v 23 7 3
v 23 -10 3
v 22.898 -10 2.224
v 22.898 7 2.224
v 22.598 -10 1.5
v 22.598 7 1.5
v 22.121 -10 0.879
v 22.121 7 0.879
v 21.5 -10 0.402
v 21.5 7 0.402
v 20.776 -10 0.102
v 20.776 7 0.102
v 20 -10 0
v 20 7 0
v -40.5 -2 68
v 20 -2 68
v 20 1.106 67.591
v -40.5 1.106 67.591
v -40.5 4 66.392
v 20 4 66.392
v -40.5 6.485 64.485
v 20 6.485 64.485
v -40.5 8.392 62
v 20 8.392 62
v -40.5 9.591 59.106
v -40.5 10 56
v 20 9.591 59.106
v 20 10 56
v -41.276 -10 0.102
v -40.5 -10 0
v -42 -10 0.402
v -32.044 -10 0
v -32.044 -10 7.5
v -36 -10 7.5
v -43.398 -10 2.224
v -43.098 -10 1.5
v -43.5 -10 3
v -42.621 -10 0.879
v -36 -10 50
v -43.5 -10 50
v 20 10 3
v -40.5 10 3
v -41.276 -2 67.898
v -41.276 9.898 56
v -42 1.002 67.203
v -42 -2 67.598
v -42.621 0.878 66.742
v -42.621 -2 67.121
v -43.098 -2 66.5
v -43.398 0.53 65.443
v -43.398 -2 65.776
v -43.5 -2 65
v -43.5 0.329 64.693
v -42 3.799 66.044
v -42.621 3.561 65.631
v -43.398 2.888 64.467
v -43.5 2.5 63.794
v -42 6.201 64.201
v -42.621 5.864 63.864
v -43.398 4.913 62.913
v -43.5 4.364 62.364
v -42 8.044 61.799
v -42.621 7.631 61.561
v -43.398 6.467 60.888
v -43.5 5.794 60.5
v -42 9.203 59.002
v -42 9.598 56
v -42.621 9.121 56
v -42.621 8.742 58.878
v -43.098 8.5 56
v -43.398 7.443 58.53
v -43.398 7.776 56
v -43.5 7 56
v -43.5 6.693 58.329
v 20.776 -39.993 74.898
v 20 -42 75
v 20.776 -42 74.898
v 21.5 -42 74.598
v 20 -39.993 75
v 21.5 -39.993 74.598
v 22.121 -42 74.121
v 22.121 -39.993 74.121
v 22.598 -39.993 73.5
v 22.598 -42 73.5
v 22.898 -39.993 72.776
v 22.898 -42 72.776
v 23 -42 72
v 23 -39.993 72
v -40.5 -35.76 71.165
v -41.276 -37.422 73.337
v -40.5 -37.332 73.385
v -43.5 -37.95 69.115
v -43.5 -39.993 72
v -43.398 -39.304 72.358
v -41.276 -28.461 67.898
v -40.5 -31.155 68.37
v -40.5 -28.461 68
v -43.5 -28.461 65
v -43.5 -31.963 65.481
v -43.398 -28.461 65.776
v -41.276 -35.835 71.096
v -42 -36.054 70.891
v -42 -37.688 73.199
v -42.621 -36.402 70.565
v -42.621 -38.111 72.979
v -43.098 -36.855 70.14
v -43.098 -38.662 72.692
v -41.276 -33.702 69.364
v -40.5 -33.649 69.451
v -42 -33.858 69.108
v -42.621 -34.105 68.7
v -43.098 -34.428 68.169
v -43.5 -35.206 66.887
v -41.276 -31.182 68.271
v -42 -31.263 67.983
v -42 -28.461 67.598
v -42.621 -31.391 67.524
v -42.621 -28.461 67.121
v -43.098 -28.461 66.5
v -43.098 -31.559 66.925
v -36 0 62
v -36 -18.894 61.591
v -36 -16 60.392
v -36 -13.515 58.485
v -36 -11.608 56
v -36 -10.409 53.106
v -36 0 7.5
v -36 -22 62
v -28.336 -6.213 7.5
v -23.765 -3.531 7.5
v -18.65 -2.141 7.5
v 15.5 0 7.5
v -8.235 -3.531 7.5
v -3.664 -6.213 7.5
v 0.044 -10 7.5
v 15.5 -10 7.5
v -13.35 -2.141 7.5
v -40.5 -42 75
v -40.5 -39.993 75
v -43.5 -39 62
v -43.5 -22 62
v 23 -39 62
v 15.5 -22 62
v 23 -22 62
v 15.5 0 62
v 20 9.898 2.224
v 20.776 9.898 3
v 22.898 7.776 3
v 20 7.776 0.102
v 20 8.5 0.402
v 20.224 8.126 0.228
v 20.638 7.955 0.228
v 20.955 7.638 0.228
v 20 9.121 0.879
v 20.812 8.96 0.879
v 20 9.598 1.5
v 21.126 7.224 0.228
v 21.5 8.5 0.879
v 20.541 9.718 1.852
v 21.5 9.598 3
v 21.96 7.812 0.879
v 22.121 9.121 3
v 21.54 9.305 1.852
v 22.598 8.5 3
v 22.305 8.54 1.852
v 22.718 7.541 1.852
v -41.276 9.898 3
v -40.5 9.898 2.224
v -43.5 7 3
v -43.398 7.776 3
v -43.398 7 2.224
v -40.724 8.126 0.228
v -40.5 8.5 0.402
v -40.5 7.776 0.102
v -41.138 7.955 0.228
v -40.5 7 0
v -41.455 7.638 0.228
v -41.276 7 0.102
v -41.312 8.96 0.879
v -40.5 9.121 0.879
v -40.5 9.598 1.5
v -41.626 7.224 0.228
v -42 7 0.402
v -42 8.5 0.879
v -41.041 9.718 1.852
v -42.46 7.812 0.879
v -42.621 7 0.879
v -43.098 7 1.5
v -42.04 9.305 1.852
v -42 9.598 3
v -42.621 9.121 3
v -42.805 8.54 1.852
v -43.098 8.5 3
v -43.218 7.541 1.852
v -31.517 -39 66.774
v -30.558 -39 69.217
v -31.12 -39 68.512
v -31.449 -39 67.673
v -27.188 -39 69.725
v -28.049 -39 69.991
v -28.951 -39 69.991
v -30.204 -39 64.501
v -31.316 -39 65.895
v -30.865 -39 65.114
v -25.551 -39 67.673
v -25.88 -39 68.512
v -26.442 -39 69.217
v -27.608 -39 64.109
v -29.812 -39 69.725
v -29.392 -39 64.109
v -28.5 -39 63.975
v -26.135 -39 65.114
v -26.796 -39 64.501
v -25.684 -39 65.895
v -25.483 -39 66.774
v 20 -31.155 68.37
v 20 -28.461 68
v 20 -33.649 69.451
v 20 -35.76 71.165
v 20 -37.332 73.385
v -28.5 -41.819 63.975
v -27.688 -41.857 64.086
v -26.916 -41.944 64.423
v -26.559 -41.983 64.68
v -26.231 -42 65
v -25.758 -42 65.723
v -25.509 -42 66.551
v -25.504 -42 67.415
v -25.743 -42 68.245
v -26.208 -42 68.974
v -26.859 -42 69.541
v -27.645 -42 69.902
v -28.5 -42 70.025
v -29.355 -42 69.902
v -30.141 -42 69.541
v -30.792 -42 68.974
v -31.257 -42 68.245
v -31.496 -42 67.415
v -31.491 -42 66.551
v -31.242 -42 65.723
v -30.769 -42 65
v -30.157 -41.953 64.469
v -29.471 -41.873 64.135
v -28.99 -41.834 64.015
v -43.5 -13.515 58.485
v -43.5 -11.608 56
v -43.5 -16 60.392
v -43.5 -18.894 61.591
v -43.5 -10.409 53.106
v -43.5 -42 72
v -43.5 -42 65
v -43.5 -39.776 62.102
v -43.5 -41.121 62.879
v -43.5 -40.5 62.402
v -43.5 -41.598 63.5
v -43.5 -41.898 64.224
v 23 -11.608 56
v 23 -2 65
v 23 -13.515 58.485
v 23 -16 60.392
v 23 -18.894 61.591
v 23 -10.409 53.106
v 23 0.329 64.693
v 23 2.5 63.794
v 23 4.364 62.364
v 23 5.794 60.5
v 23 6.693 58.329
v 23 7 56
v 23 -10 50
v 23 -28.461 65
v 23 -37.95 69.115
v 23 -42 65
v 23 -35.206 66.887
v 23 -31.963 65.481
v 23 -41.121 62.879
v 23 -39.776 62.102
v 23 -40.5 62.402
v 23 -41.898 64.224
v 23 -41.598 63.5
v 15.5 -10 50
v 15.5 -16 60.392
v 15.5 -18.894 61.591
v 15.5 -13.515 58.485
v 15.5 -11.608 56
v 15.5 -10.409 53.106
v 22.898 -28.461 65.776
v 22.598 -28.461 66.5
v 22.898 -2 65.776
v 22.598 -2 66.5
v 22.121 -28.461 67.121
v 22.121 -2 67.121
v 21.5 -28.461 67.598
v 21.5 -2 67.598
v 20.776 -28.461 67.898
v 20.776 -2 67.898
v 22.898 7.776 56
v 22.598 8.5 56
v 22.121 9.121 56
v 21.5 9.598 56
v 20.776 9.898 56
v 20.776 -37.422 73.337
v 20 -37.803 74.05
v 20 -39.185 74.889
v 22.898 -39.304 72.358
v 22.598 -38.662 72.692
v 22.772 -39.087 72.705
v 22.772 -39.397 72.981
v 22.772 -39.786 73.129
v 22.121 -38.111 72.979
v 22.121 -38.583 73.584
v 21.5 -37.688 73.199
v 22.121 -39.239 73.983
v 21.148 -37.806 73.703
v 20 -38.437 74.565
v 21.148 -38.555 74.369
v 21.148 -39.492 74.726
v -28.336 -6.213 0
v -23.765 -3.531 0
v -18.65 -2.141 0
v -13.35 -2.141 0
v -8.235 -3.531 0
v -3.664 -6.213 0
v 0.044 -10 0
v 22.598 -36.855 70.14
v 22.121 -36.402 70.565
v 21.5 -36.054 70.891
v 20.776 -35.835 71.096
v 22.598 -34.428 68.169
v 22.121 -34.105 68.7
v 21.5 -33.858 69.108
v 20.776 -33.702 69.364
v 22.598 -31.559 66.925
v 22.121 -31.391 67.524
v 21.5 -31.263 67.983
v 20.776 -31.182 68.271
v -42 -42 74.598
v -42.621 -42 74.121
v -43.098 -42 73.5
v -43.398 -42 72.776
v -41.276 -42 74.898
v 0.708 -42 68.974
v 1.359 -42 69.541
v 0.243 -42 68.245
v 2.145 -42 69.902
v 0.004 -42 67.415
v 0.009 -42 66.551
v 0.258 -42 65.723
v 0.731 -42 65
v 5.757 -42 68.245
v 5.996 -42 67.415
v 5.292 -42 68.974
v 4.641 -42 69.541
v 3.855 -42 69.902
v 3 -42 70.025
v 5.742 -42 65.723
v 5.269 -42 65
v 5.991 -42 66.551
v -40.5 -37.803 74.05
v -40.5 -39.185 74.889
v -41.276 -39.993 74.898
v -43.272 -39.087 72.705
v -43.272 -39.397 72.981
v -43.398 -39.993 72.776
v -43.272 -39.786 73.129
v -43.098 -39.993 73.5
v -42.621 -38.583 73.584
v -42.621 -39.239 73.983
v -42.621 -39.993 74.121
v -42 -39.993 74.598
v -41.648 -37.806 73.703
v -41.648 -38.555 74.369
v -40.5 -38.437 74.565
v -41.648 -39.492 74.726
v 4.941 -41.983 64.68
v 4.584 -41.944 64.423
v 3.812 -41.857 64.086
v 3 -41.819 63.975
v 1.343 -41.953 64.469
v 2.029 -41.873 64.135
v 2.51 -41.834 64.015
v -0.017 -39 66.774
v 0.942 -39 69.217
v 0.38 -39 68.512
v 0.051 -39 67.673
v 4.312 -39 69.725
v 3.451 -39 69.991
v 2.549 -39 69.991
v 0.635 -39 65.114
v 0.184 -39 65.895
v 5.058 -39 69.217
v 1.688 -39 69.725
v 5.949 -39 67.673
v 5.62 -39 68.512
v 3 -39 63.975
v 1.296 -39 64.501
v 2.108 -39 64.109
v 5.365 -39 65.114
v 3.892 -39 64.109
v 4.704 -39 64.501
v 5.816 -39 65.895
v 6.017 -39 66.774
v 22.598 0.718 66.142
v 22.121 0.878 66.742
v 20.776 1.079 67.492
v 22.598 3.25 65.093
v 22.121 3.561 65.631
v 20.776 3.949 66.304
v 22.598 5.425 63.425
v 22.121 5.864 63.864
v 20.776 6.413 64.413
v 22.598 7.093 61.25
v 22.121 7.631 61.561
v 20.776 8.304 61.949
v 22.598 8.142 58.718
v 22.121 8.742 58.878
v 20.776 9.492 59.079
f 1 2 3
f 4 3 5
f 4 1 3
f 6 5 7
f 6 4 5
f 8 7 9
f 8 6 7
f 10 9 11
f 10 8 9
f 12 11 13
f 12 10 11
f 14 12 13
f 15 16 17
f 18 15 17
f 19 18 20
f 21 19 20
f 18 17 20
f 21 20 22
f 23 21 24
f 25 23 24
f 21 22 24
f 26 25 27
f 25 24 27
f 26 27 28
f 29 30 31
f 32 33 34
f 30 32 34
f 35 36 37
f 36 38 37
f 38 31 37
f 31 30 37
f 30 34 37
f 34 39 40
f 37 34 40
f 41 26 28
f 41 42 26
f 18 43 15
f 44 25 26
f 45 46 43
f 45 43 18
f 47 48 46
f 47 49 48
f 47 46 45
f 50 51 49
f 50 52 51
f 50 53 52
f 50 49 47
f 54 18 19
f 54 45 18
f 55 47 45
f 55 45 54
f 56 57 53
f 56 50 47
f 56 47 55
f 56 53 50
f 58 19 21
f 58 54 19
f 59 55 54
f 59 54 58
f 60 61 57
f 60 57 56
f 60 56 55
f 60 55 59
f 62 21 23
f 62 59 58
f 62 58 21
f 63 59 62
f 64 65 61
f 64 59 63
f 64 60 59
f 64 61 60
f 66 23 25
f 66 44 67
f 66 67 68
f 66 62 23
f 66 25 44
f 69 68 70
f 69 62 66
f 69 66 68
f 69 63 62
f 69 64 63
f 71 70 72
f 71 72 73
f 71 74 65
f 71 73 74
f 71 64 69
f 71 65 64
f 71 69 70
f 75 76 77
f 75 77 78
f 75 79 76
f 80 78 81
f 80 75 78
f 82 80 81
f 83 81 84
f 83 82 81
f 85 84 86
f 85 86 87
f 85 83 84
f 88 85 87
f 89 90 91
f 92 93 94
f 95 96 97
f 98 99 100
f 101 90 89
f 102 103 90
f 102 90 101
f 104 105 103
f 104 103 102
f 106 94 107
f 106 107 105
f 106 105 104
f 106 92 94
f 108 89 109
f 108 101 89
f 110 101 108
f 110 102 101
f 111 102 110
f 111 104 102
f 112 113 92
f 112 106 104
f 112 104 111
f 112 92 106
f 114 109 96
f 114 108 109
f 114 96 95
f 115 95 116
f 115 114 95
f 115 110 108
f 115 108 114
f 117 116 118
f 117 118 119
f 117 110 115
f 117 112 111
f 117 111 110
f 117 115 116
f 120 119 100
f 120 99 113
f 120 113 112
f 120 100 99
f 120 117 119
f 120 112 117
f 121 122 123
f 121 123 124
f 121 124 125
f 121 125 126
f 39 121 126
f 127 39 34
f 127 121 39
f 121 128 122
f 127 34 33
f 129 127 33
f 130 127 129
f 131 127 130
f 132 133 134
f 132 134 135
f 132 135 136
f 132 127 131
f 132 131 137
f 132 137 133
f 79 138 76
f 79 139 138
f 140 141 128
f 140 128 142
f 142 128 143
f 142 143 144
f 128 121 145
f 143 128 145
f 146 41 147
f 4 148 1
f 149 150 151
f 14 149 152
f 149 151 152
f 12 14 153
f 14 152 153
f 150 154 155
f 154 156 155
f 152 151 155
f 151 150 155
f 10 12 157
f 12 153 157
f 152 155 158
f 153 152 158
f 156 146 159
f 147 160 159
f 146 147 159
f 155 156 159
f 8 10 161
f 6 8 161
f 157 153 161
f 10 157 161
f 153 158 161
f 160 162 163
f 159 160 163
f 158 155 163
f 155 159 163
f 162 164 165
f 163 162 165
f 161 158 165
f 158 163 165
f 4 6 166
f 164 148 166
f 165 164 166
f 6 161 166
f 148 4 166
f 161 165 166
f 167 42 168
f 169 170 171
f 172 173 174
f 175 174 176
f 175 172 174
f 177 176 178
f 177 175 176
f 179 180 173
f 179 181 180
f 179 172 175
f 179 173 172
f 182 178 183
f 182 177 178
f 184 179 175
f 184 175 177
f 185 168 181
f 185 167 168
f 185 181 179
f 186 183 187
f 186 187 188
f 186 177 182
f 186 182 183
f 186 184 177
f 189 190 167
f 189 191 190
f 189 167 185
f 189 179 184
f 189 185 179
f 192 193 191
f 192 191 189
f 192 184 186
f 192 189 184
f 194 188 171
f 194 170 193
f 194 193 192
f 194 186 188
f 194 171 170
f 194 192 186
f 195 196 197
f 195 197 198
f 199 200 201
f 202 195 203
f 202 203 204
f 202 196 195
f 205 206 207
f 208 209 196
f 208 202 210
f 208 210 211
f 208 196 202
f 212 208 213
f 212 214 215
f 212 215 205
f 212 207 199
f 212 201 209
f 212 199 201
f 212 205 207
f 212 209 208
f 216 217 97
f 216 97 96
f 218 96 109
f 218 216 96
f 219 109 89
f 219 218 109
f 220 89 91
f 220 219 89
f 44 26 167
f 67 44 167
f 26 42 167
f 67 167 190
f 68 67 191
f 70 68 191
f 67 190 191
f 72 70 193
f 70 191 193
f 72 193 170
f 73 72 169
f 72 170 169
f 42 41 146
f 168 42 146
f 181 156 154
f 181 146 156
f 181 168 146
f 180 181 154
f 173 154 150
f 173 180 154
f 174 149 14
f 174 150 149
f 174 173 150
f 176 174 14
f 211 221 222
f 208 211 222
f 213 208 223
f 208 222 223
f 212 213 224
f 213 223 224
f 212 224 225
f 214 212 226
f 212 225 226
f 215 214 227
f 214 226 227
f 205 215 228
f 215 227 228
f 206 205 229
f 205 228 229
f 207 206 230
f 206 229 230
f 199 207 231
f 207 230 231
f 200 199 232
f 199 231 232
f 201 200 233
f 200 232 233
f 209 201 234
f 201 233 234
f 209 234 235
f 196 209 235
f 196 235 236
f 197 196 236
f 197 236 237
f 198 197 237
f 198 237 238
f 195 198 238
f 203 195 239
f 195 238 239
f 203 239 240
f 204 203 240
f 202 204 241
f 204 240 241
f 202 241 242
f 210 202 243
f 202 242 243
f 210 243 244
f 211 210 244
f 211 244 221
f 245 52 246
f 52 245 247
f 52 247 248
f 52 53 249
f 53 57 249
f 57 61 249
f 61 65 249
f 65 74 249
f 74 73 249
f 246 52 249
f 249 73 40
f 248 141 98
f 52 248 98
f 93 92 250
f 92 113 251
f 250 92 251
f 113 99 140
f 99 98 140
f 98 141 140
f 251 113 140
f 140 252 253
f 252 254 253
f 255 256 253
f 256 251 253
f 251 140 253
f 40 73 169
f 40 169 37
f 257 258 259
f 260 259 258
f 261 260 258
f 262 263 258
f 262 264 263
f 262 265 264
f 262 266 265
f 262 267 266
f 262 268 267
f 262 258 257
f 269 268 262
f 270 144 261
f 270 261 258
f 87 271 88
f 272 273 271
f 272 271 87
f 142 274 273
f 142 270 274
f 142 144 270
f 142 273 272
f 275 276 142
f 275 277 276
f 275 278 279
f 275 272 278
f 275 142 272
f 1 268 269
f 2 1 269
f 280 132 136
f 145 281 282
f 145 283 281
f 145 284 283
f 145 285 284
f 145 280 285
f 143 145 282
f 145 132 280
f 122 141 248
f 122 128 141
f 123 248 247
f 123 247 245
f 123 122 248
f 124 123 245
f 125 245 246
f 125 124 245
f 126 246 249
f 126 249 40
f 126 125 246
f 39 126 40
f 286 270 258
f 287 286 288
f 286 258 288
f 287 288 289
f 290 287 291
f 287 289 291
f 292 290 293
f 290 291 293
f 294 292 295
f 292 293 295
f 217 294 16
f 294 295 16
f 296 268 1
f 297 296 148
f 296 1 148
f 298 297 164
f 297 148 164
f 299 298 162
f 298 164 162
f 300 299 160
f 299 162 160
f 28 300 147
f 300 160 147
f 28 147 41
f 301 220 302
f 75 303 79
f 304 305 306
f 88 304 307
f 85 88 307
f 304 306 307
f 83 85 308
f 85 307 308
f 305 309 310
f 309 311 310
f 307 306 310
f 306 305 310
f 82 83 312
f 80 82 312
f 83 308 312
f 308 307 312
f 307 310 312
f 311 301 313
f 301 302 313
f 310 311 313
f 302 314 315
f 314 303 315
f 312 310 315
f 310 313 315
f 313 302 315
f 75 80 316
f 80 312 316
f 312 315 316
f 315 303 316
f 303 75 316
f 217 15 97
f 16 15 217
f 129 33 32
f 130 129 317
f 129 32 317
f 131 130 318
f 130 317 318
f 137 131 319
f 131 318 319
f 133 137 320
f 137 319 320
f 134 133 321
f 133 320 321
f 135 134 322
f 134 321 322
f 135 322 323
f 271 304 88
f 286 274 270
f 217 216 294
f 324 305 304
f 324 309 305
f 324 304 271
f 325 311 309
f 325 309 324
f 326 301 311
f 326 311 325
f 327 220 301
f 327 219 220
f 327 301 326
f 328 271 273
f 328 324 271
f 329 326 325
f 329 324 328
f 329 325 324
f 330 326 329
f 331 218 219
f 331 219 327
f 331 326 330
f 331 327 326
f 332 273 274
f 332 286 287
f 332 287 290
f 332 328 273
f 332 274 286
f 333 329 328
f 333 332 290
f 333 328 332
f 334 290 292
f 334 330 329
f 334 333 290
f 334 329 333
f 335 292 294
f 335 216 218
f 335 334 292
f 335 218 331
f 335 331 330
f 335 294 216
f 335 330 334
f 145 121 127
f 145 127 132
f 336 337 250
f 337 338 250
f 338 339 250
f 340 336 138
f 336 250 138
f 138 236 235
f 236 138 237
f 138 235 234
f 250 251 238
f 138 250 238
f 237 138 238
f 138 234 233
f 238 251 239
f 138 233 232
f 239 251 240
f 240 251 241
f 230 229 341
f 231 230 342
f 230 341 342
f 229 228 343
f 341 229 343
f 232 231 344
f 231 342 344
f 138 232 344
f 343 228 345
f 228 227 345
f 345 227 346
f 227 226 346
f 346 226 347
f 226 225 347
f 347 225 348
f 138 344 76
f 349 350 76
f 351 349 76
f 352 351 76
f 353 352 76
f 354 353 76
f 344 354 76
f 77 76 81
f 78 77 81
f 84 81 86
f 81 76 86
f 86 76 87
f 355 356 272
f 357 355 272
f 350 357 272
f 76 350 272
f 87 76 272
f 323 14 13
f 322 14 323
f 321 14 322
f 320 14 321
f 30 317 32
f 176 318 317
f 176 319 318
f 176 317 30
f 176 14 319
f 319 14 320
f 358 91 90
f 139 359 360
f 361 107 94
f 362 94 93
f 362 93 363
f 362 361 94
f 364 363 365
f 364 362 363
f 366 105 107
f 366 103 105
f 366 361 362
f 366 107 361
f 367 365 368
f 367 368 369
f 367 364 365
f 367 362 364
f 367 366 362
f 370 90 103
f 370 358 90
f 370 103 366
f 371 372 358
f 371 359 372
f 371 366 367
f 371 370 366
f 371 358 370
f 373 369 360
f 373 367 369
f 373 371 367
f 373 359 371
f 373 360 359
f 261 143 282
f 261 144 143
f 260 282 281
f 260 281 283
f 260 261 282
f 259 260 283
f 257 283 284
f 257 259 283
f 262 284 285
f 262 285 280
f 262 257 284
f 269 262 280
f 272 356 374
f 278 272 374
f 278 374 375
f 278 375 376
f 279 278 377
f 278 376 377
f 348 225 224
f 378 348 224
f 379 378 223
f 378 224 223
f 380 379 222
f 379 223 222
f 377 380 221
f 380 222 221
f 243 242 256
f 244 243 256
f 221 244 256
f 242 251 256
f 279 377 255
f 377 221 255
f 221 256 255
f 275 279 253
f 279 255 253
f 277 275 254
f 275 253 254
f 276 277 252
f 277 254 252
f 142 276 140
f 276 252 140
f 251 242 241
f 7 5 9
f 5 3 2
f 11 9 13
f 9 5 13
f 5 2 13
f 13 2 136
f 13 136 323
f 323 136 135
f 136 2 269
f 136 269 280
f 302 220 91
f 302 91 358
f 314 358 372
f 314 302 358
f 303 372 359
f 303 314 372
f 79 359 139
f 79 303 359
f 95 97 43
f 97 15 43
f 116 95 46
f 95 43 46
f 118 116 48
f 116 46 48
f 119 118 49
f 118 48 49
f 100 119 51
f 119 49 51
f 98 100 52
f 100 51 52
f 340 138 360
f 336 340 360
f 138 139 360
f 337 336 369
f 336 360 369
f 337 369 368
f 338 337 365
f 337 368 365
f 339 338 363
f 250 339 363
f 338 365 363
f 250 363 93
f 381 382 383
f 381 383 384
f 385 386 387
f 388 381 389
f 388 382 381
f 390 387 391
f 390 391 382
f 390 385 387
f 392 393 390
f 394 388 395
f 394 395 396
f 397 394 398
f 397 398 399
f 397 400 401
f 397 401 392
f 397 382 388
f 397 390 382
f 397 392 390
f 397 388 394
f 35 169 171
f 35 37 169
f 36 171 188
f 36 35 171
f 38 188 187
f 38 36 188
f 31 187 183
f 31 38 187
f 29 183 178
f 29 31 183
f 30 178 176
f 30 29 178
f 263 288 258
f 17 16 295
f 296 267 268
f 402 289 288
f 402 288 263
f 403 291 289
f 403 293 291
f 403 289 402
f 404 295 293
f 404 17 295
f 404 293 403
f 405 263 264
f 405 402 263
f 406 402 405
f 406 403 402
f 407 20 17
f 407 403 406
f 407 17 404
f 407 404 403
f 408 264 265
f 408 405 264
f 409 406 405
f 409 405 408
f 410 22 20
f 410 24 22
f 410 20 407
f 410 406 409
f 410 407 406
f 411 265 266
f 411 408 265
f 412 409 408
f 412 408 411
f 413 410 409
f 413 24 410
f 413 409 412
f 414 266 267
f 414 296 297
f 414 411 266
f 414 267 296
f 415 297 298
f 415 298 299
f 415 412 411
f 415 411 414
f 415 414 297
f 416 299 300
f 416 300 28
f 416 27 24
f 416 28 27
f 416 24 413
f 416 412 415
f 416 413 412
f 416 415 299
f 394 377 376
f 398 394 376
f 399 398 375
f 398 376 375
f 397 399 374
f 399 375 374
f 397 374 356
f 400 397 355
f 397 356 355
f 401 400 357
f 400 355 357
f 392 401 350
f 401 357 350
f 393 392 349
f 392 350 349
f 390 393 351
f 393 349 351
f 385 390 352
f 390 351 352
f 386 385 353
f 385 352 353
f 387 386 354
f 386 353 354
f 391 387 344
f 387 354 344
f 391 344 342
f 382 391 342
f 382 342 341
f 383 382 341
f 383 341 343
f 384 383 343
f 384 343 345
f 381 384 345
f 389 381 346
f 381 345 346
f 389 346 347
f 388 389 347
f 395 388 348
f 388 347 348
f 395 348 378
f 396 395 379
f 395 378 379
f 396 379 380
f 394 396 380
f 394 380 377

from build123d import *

# Parameters (mm, degrees)
BOSS_EXTRUDE1_DEPTH = 10
SKETCH2_W           = 66.5
SKETCH2_H           = 6
BOSS_EXTRUDE2_DEPTH = 42
BOSS_EXTRUDE3_DEPTH = 10
SKETCH3_R           = 20.035
CUT_EXTRUDE2_DEPTH  = 10
FILLET1_R           = 12
SKETCH7_W           = 66.5
SKETCH7_H           = 4
BOSS_EXTRUDE4_DEPTH = 7
SKETCH8_R           = 3.025
CUT_EXTRUDE3_DEPTH  = 3
FILLET2_R           = 12
FILLET3_R           = 10
FILLET4_R           = 3
FILLET5_R           = 3


with BuildPart() as part:
    # Sketch1 → Boss-Extrude1 (new body)
    with BuildSketch(Plane(origin=(0, 0, 0), x_dir=(1, 0, 0), z_dir=(0, 1, 0))):
        Polygon((0, 0), (-43.5, 0), (-43.5, -68), (23, -68), (23, 0), align=None)
    extrude(amount=BOSS_EXTRUDE1_DEPTH)

    # Sketch2 → Boss-Extrude2 (add)
    with BuildSketch(Plane.XZ):
        with Locations((-10.25, 65)):
            Rectangle(SKETCH2_W, SKETCH2_H)
    extrude(amount=BOSS_EXTRUDE2_DEPTH)

    # Sketch4 → Boss-Extrude3 (add)
    with BuildSketch(Plane.XZ):
        Polygon((-43.5, 62), (-36, 62), (-36, 7.5), (15.5, 7.5), (15.5, 62), (23, 62), (23, 0), (-43.5, 0), align=None)
    extrude(amount=BOSS_EXTRUDE3_DEPTH)

    # Sketch3 → Cut-Extrude2 (cut)
    with BuildSketch(Plane(origin=(0, 0, 0), x_dir=(-1, 0, 0), z_dir=(0, 0, -1))):
        with Locations((16, -22)):
            Circle(SKETCH3_R)
    extrude(amount=-CUT_EXTRUDE2_DEPTH, mode=Mode.SUBTRACT)

    # Fillet1
    fillet1_edges = [part.edges().sort_by_distance(p)[0] for p in [
        (19.25, -10, 62),
        (-39.75, -10, 62),
    ]]
    fillet(fillet1_edges, radius=FILLET1_R)

    # Sketch7 → Boss-Extrude4 (add)
    with BuildSketch(Plane.XY.offset(68)):
        with Locations((-10.25, -40)):
            Rectangle(SKETCH7_W, SKETCH7_H)
    extrude(amount=BOSS_EXTRUDE4_DEPTH)

    # Sketch8 → Cut-Extrude3 (cut)
    with BuildSketch(Plane.XZ.offset(42)):
        with Locations(Location((-28.5, 67, 0), (0, 0, 270))):
            Circle(SKETCH8_R)
        with Locations(Location((3, 67, 0), (0, 0, 270))):
            Circle(SKETCH8_R)
    extrude(amount=-CUT_EXTRUDE3_DEPTH, mode=Mode.SUBTRACT)

    # Fillet2
    fillet2_edges = [part.edges().sort_by_distance(p)[0] for p in [
        (-10.25, 10, 68),
    ]]
    fillet(fillet2_edges, radius=FILLET2_R)

    # Fillet3
    # the kernel refuses this fillet: 10 mm, written as the material it adds along each edge
    with BuildSketch(Plane(origin=(23, -38, 68), x_dir=(0, 1, 0), z_dir=(-1, 0, 0))) as fillet3_piece_1:
        with BuildLine():
            CenterArc((9.539392014, -10), FILLET3_R, 90, 72.542396876)
            Line((0, -7), (-0.19078784, -6.94))
            ThreePointArc((-0.19078784, -6.94), (-0.2, -3.5), (-0.2, 0))
            Line((-0.2, 0), (0, 0.2))
            Line((0, 0.2), (9.539392014, 0.2))
            Line((9.539392014, 0.2), (9.539392014, 0))
        make_face()
    extrude(amount=66.5)

    # Fillet4
    # the kernel refuses this fillet: 3 mm, written as the material it takes off along each edge
    with BuildSketch(Plane(origin=(-51, -42, 62), x_dir=(0, 0, 1), z_dir=(1, 0, 0))) as fillet4_piece_1:
        with BuildLine():
            CenterArc((FILLET4_R, -FILLET4_R), FILLET4_R, 90, 90)
            Line((0, -FILLET4_R), (0, 0))
            Line((0, 0), (FILLET4_R, 0))
        make_face()
    extrude(amount=81.5, mode=Mode.SUBTRACT)

    # Fillet5
    fillet5_edges = [part.edges().sort_by_distance(p)[0] for p in [
        (23, 10, 28),
        (23, -15.230303993, 68),
        (23, 6.485281374, 64.485281374),
        (-43.5, -15.230303993, 68),
        (-43.5, 6.485281374, 64.485281374),
        (-43.5, -34.376687769, 69.937742252),
        (23, -34.376687769, 69.937742252),
        (-43.5, 10, 28),
        (-10.25, 10, 0),
        (-43.5, -40, 75),
        (23, -40, 75),
        (23, 0, 0),
        (-10.25, -38, 75),
        (-43.5, 0, 0),
    ]]
    fillet(fillet5_edges, radius=FILLET5_R)


solid = part.part
